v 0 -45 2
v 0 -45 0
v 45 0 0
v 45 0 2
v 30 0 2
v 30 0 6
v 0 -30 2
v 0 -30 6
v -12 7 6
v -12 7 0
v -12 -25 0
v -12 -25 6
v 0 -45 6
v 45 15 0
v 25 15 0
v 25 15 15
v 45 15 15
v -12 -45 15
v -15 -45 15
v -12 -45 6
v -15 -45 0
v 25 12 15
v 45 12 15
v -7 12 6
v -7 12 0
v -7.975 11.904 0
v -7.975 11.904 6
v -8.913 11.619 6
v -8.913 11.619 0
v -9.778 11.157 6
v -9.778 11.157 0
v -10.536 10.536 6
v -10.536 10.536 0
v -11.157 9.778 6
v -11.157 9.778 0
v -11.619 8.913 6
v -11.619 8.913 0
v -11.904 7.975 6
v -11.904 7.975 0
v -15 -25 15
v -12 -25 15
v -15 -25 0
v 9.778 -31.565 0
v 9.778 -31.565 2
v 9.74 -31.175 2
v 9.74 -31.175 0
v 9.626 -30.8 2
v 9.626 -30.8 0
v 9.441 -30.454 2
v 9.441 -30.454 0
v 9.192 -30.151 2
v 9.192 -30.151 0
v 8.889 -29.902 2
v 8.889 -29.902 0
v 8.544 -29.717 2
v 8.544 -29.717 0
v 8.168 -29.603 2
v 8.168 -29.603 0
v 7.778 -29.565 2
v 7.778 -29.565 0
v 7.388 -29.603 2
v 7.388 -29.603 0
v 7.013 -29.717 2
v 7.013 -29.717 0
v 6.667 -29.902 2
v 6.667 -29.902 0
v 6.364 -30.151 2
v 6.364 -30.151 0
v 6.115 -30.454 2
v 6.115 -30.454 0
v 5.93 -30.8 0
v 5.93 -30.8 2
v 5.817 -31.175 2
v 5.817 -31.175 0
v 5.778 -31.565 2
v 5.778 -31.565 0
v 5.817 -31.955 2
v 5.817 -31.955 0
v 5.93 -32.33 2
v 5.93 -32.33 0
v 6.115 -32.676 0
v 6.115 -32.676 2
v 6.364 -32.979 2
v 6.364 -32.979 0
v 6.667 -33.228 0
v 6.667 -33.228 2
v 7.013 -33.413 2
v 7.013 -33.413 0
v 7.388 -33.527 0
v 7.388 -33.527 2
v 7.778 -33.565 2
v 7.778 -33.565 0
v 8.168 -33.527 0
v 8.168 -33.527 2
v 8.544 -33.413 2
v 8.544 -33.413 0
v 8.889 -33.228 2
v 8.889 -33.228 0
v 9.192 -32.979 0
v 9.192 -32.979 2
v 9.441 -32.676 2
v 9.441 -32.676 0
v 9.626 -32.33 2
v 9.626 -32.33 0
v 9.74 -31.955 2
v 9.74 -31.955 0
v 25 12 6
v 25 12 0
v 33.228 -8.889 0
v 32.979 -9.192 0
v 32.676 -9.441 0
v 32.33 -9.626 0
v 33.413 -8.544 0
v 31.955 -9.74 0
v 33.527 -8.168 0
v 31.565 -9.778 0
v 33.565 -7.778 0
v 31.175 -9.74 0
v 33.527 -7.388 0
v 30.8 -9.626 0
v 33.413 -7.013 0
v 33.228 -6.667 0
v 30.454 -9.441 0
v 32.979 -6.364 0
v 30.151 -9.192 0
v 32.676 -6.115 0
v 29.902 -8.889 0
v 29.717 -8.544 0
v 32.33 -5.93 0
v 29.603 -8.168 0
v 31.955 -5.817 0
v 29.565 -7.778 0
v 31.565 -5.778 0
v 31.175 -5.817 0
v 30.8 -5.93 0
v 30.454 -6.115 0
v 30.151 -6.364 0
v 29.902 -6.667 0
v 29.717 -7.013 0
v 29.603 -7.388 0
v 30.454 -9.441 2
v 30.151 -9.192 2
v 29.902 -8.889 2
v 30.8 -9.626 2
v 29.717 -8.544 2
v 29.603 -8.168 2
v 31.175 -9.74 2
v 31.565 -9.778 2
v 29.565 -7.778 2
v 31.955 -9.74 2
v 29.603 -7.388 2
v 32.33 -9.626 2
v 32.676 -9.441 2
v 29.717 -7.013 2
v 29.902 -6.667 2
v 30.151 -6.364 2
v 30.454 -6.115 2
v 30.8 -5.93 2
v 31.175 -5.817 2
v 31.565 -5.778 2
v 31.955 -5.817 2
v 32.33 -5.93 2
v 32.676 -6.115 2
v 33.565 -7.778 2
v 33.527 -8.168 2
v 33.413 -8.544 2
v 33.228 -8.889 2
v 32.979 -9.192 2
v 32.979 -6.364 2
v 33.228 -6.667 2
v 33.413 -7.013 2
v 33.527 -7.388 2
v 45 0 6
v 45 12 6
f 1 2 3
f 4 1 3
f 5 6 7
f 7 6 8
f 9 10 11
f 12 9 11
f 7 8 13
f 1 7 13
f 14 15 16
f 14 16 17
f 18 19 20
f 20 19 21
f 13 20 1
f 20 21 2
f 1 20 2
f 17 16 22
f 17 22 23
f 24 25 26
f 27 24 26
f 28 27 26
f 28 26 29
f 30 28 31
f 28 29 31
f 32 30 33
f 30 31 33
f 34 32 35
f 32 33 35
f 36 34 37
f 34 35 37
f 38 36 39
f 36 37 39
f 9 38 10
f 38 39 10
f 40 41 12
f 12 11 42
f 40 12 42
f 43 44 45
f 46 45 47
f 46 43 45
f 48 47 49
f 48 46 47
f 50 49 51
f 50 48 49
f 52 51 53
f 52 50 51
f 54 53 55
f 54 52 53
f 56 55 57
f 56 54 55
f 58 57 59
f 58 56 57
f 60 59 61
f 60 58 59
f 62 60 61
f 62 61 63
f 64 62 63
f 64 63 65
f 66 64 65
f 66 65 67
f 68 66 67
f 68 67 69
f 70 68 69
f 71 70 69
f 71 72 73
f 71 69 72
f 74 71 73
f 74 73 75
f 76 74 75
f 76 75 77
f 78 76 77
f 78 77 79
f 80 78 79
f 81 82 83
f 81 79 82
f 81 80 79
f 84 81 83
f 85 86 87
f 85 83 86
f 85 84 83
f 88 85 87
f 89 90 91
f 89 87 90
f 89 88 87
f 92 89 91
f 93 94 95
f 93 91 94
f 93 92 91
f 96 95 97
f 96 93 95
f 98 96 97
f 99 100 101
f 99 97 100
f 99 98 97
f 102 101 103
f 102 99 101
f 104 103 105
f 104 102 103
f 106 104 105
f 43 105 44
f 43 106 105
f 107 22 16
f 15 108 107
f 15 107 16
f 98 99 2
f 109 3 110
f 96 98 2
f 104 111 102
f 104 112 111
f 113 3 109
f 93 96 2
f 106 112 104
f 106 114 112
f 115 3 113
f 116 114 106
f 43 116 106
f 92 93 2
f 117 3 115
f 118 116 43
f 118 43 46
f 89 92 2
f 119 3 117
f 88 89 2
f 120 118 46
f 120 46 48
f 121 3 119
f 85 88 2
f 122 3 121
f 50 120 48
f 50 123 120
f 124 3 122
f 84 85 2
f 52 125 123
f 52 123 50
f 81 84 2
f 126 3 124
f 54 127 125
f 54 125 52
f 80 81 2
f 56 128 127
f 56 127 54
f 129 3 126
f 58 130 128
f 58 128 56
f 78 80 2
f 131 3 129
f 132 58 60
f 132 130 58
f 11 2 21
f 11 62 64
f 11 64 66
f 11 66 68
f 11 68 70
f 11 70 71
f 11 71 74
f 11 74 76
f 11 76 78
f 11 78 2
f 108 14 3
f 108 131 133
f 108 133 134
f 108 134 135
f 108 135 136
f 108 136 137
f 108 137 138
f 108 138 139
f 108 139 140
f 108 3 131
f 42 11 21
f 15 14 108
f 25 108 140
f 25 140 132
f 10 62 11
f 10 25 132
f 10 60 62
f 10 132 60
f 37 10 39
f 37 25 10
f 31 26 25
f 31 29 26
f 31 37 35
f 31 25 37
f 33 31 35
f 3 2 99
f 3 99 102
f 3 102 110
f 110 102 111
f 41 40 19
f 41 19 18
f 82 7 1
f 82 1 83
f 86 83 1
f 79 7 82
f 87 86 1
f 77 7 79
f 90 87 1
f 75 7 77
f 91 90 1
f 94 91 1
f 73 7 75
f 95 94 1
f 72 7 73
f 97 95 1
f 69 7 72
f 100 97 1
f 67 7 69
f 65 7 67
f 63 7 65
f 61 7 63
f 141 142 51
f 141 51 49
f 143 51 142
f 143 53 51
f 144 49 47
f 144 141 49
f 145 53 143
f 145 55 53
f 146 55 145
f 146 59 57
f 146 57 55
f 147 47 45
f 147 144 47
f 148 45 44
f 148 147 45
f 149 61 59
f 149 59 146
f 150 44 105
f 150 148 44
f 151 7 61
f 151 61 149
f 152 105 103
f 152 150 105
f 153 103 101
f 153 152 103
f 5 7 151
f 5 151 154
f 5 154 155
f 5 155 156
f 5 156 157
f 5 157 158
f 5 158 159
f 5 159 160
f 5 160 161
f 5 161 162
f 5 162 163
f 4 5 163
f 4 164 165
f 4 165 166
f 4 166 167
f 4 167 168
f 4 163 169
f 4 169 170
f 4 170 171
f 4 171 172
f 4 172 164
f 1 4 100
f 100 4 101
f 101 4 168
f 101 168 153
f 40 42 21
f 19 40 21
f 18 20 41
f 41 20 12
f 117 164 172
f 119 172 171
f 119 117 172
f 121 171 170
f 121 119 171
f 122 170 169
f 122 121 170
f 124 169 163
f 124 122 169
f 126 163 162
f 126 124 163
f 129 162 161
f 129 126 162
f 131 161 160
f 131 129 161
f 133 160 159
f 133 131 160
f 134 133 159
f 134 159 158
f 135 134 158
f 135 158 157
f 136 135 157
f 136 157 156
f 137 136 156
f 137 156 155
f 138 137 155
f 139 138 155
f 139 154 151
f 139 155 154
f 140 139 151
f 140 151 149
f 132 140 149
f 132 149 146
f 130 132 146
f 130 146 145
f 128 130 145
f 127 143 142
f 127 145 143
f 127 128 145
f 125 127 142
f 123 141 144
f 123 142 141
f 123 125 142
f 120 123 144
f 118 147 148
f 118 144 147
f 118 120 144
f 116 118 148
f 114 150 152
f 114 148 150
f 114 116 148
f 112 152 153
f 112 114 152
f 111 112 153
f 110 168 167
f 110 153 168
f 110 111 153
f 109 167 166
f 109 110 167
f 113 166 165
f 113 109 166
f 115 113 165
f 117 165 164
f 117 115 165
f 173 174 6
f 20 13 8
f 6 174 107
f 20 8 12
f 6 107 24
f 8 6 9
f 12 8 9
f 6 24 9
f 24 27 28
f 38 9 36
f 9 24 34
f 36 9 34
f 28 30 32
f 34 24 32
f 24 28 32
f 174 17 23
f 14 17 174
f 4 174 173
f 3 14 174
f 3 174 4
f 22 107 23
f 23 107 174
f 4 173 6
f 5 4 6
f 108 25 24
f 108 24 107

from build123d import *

# Parameters (mm, degrees)
SKETCH_R      = 2
PAD_DEPTH     = 6
SKETCH001_W   = 3
SKETCH001_H   = 20
SKETCH001_W_2 = 20
SKETCH001_H_2 = 3
PAD001_DEPTH  = 15
POCKET_DEPTH  = 4


with BuildPart() as part:
    # Sketch → Pad (new body)
    with BuildSketch(Plane.XY):
        with BuildLine():
            Line((-7, 12), (25, 12))
            Line((25, 12), (25, 15))
            Line((25, 15), (45, 15))
            Line((45, 15), (45, 0))
            Line((0, -45), (45, 0))
            Line((-15, -45), (0, -45))
            Line((-15, -25), (-15, -45))
            Line((-12, -25), (-15, -25))
            Line((-12, 7), (-12, -25))
            ThreePointArc((-7, 12), (-10.535534, 10.535534), (-12, 7))
        make_face()
        with Locations((31.564971, -7.778175)):
            Circle(SKETCH_R, mode=Mode.SUBTRACT)
        with Locations((7.778175, -31.564971)):
            Circle(SKETCH_R, mode=Mode.SUBTRACT)
    extrude(amount=PAD_DEPTH)

    # Sketch001 → Pad001 (join)
    with BuildSketch(Plane.XY):
        with Locations((-13.5, -35)):
            Rectangle(SKETCH001_W, SKETCH001_H)
        with Locations((35, 13.5)):
            Rectangle(SKETCH001_W_2, SKETCH001_H_2)
    extrude(amount=PAD001_DEPTH)

    # Sketch002 (on DatumPlane) → Pocket (cut)
    with BuildSketch(Plane.XY.offset(6)):
        Polygon((45, 0), (30, 0), (0, -30), (0, -45), align=None)
    extrude(amount=-POCKET_DEPTH, mode=Mode.SUBTRACT)


solid = part.part
